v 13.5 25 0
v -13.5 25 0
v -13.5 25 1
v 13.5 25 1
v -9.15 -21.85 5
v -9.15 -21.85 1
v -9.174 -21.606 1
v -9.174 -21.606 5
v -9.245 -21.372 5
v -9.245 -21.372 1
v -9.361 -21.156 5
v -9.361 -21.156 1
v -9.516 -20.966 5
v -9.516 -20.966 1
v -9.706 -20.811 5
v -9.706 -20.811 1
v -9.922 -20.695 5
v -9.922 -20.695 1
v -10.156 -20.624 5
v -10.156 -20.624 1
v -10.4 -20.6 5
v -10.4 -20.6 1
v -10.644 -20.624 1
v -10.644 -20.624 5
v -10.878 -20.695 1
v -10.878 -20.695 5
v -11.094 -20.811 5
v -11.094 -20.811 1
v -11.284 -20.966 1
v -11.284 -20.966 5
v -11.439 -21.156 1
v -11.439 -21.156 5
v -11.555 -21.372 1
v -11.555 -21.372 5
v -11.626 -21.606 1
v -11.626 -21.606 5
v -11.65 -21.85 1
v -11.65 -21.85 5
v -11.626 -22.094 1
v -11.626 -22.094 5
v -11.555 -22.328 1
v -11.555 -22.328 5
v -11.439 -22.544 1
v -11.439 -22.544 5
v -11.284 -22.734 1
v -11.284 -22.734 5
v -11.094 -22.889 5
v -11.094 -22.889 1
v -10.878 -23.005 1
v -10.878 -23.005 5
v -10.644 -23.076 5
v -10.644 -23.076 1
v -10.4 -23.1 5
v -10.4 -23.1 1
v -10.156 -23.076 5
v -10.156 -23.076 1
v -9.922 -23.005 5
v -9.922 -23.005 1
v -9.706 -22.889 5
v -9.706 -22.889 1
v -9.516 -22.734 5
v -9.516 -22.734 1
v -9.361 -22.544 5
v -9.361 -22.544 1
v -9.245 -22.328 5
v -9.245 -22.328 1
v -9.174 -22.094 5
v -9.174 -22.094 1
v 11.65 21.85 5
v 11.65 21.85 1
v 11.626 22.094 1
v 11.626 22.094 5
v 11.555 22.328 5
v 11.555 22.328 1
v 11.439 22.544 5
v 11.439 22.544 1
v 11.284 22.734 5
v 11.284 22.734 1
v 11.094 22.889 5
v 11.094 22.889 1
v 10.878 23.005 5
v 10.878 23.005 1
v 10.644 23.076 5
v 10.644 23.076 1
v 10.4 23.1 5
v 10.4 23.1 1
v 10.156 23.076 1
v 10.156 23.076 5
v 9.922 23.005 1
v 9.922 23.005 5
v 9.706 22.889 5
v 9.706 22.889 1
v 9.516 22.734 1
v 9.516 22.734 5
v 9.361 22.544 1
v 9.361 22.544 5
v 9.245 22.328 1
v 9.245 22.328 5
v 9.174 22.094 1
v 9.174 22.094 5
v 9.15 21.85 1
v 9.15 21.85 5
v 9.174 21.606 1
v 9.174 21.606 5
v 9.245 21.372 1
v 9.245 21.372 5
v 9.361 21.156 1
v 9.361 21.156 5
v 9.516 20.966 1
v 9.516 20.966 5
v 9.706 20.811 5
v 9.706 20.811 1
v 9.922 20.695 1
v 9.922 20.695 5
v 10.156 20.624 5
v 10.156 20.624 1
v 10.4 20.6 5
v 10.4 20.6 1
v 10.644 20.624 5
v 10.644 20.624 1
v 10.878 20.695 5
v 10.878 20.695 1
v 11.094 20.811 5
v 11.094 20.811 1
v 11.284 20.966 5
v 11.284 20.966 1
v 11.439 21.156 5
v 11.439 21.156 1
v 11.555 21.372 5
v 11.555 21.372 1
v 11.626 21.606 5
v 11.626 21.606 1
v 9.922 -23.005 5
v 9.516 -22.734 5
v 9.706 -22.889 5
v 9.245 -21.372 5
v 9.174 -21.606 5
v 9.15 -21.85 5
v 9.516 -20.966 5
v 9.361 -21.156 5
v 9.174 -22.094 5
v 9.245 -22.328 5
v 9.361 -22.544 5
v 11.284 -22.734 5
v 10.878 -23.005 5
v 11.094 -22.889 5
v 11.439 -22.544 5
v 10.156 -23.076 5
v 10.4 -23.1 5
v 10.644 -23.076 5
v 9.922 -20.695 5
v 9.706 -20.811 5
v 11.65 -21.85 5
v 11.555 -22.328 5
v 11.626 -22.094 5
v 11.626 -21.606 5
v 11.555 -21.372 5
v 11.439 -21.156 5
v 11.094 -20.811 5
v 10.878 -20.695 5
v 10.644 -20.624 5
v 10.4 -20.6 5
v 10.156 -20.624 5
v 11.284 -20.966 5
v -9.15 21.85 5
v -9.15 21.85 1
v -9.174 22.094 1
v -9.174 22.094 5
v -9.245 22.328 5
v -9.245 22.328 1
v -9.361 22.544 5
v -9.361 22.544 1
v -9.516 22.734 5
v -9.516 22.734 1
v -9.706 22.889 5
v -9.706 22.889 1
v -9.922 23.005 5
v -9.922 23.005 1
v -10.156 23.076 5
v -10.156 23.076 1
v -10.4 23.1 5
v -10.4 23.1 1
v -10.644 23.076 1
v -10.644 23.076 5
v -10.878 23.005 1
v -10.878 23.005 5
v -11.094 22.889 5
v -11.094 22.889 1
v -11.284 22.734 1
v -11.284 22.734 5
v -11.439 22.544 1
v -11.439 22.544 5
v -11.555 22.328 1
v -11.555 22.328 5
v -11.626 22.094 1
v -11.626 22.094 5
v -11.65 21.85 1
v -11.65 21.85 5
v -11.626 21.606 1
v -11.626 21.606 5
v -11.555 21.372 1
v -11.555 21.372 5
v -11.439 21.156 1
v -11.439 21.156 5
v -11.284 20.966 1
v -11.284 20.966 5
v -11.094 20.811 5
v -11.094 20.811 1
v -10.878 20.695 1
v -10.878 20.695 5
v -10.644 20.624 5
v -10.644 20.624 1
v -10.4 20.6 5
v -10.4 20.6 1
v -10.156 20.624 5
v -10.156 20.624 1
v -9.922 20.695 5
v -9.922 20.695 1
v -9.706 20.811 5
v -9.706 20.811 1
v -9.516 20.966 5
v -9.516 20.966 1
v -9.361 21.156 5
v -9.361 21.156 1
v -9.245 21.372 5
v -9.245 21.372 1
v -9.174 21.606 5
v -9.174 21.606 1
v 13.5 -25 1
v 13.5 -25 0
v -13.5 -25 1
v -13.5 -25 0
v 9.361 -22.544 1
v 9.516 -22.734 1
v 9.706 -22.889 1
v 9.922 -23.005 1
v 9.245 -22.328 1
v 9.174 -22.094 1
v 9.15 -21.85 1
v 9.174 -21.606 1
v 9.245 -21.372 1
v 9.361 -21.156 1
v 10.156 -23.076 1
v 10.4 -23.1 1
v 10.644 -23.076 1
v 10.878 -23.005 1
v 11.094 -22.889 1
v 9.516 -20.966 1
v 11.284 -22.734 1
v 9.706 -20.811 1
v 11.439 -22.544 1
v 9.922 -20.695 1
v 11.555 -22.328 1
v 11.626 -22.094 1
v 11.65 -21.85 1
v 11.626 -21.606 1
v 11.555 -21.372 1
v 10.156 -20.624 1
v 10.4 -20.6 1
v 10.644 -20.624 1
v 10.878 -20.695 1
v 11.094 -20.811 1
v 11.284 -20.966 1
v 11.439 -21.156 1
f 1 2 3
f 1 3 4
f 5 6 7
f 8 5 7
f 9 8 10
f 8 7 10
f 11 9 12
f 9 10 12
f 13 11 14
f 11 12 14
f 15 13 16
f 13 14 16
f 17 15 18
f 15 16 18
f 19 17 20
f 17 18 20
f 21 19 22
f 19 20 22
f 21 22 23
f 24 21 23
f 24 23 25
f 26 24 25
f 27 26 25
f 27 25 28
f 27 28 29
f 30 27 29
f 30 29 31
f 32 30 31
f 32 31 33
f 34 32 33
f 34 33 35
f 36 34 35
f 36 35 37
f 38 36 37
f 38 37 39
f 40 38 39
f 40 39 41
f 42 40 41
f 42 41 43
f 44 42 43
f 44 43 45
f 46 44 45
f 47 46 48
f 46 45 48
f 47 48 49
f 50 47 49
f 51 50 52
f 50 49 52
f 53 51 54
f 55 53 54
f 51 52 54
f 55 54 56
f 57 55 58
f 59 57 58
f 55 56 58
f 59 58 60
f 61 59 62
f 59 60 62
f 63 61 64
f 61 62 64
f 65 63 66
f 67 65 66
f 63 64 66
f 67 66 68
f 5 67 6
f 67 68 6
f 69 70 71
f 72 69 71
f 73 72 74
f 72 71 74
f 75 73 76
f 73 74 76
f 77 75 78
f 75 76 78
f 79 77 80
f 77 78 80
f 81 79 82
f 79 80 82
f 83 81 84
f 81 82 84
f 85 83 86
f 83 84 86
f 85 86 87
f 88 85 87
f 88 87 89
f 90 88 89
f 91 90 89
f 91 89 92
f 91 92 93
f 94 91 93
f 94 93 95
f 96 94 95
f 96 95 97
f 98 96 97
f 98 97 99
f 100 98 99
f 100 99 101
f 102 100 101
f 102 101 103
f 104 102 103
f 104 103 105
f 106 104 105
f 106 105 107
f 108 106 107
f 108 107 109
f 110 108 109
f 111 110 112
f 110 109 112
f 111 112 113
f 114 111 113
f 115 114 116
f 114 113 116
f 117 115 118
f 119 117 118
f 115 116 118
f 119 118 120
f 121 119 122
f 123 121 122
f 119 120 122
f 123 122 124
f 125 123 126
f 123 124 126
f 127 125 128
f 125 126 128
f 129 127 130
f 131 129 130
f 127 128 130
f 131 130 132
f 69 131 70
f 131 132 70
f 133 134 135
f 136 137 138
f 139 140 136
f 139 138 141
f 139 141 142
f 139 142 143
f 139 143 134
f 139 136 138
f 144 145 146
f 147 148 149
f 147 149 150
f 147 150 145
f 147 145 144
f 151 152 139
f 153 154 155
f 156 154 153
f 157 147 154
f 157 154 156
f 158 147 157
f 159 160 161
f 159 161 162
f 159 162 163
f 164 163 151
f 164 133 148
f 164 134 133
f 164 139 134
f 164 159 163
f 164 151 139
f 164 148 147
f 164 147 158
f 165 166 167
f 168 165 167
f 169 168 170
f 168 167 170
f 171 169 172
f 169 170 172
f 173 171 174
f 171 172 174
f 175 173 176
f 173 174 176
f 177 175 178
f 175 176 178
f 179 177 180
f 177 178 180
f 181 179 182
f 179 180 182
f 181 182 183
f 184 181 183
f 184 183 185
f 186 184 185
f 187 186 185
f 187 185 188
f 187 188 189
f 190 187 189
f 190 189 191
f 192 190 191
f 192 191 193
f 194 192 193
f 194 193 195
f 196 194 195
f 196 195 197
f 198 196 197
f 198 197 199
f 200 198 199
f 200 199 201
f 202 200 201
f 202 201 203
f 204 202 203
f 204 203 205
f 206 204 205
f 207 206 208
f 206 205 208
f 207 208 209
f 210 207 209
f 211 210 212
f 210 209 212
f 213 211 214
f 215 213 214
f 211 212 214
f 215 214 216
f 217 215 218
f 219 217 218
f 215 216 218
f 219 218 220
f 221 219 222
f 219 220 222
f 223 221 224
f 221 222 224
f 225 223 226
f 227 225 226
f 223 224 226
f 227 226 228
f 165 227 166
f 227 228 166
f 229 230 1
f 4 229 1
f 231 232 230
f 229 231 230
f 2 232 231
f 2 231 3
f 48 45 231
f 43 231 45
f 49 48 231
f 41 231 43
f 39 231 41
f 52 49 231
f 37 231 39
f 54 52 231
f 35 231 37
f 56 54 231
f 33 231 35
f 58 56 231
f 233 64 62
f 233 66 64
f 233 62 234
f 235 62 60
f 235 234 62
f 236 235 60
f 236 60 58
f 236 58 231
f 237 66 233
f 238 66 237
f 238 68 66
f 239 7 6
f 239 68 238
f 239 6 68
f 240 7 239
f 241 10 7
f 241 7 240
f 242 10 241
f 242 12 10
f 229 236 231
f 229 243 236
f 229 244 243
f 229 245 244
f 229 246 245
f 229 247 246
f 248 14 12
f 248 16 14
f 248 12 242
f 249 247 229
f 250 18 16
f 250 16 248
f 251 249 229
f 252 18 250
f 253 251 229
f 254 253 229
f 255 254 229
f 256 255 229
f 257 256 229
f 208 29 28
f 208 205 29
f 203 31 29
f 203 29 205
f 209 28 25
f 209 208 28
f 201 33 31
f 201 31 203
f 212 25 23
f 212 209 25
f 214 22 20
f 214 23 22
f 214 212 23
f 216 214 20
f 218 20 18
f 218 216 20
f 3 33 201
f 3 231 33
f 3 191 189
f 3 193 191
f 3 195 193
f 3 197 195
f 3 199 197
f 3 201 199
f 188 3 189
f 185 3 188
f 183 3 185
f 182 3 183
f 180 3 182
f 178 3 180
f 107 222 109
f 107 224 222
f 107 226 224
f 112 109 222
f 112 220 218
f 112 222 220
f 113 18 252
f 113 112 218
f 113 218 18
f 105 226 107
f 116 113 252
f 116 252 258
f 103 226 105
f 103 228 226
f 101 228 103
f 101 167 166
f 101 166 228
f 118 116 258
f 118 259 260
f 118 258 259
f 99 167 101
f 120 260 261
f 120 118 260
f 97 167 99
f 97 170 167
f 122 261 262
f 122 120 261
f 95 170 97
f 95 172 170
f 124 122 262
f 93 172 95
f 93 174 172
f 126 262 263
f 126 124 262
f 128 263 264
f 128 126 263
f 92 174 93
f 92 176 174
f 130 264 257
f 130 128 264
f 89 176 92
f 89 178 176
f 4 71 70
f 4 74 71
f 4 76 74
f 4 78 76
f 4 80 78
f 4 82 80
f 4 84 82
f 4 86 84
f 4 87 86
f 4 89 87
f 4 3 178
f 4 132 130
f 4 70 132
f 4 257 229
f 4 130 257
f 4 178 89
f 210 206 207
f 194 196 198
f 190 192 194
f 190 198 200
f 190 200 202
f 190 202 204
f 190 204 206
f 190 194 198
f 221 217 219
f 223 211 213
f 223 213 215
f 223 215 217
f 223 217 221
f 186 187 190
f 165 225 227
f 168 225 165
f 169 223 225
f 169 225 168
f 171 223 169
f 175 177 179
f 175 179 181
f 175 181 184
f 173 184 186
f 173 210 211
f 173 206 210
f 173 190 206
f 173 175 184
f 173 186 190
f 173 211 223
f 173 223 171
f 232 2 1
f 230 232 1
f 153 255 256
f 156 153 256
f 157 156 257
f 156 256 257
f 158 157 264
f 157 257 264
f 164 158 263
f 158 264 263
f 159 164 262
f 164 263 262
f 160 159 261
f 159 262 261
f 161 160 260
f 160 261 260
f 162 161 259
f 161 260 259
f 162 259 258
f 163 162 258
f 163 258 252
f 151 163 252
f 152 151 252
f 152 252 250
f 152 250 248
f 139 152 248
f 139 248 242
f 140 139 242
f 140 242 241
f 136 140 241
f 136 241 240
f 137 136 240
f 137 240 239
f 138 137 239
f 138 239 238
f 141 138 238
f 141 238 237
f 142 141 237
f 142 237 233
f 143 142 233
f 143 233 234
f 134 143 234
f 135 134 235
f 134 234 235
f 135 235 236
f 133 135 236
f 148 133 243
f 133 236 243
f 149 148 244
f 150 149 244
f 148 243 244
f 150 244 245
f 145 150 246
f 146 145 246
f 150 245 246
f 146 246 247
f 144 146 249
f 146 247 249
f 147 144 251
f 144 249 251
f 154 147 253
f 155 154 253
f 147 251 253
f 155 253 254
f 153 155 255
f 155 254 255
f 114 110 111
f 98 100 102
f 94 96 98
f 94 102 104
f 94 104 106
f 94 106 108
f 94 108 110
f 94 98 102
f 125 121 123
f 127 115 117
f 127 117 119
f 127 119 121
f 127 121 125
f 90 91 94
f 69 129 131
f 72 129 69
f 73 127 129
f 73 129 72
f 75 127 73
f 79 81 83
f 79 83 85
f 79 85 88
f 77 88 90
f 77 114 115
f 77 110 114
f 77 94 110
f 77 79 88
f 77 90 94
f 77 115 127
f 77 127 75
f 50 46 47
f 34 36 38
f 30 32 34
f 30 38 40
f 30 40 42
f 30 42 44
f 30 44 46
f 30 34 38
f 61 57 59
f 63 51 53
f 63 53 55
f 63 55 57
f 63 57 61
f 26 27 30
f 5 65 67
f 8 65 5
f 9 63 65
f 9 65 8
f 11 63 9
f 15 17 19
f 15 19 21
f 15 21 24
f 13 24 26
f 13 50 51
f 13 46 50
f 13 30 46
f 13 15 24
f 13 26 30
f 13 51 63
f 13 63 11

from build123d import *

# Parameters (mm, degrees)
F0_R     = 1.25
F1_DEPTH = 5
F0_W     = 27
F0_H     = 50
F2_DEPTH = 1


with BuildPart() as f1:
    # F0 (on Top) → F1 (new body)
    with BuildSketch(Plane.XY):
        with Locations((-10.4, 21.85)):
            Circle(F0_R)
    extrude(amount=F1_DEPTH)



with BuildPart() as f1b:
    # F0 (on Top) → F1, piece 2 (new body)
    with BuildSketch(Plane.XY):
        with Locations((-10.4, -21.85)):
            Circle(F0_R)
    extrude(amount=F1_DEPTH)


with BuildPart() as f1c:
    # F0 (on Top) → F1, piece 3 (new body)
    with BuildSketch(Plane.XY):
        with Locations((10.4, -21.85)):
            Circle(F0_R)
    extrude(amount=F1_DEPTH)


with BuildPart() as f1d:
    # F0 (on Top) → F1, piece 4 (new body)
    with BuildSketch(Plane.XY):
        with Locations((10.4, 21.85)):
            Circle(F0_R)
    extrude(amount=F1_DEPTH)


with BuildPart() as f1_1:
    add(f1.part)

    add(f1b.part)  # F2 merges F1b

    add(f1c.part)  # F2 merges F1c

    add(f1d.part)  # F2 merges F1d
    # F0 (on Top) → F2 (join)
    with BuildSketch(Plane.XY):
        Rectangle(F0_W, F0_H)
        with Locations((-10.4, -21.85)):
            Circle(F0_R, mode=Mode.SUBTRACT)
        with Locations((10.4, -21.85)):
            Circle(F0_R, mode=Mode.SUBTRACT)
        with Locations((-10.4, 21.85)):
            Circle(F0_R, mode=Mode.SUBTRACT)
        with Locations((10.4, 21.85)):
            Circle(F0_R, mode=Mode.SUBTRACT)
    extrude(amount=F2_DEPTH)


solid = f1_1.part
